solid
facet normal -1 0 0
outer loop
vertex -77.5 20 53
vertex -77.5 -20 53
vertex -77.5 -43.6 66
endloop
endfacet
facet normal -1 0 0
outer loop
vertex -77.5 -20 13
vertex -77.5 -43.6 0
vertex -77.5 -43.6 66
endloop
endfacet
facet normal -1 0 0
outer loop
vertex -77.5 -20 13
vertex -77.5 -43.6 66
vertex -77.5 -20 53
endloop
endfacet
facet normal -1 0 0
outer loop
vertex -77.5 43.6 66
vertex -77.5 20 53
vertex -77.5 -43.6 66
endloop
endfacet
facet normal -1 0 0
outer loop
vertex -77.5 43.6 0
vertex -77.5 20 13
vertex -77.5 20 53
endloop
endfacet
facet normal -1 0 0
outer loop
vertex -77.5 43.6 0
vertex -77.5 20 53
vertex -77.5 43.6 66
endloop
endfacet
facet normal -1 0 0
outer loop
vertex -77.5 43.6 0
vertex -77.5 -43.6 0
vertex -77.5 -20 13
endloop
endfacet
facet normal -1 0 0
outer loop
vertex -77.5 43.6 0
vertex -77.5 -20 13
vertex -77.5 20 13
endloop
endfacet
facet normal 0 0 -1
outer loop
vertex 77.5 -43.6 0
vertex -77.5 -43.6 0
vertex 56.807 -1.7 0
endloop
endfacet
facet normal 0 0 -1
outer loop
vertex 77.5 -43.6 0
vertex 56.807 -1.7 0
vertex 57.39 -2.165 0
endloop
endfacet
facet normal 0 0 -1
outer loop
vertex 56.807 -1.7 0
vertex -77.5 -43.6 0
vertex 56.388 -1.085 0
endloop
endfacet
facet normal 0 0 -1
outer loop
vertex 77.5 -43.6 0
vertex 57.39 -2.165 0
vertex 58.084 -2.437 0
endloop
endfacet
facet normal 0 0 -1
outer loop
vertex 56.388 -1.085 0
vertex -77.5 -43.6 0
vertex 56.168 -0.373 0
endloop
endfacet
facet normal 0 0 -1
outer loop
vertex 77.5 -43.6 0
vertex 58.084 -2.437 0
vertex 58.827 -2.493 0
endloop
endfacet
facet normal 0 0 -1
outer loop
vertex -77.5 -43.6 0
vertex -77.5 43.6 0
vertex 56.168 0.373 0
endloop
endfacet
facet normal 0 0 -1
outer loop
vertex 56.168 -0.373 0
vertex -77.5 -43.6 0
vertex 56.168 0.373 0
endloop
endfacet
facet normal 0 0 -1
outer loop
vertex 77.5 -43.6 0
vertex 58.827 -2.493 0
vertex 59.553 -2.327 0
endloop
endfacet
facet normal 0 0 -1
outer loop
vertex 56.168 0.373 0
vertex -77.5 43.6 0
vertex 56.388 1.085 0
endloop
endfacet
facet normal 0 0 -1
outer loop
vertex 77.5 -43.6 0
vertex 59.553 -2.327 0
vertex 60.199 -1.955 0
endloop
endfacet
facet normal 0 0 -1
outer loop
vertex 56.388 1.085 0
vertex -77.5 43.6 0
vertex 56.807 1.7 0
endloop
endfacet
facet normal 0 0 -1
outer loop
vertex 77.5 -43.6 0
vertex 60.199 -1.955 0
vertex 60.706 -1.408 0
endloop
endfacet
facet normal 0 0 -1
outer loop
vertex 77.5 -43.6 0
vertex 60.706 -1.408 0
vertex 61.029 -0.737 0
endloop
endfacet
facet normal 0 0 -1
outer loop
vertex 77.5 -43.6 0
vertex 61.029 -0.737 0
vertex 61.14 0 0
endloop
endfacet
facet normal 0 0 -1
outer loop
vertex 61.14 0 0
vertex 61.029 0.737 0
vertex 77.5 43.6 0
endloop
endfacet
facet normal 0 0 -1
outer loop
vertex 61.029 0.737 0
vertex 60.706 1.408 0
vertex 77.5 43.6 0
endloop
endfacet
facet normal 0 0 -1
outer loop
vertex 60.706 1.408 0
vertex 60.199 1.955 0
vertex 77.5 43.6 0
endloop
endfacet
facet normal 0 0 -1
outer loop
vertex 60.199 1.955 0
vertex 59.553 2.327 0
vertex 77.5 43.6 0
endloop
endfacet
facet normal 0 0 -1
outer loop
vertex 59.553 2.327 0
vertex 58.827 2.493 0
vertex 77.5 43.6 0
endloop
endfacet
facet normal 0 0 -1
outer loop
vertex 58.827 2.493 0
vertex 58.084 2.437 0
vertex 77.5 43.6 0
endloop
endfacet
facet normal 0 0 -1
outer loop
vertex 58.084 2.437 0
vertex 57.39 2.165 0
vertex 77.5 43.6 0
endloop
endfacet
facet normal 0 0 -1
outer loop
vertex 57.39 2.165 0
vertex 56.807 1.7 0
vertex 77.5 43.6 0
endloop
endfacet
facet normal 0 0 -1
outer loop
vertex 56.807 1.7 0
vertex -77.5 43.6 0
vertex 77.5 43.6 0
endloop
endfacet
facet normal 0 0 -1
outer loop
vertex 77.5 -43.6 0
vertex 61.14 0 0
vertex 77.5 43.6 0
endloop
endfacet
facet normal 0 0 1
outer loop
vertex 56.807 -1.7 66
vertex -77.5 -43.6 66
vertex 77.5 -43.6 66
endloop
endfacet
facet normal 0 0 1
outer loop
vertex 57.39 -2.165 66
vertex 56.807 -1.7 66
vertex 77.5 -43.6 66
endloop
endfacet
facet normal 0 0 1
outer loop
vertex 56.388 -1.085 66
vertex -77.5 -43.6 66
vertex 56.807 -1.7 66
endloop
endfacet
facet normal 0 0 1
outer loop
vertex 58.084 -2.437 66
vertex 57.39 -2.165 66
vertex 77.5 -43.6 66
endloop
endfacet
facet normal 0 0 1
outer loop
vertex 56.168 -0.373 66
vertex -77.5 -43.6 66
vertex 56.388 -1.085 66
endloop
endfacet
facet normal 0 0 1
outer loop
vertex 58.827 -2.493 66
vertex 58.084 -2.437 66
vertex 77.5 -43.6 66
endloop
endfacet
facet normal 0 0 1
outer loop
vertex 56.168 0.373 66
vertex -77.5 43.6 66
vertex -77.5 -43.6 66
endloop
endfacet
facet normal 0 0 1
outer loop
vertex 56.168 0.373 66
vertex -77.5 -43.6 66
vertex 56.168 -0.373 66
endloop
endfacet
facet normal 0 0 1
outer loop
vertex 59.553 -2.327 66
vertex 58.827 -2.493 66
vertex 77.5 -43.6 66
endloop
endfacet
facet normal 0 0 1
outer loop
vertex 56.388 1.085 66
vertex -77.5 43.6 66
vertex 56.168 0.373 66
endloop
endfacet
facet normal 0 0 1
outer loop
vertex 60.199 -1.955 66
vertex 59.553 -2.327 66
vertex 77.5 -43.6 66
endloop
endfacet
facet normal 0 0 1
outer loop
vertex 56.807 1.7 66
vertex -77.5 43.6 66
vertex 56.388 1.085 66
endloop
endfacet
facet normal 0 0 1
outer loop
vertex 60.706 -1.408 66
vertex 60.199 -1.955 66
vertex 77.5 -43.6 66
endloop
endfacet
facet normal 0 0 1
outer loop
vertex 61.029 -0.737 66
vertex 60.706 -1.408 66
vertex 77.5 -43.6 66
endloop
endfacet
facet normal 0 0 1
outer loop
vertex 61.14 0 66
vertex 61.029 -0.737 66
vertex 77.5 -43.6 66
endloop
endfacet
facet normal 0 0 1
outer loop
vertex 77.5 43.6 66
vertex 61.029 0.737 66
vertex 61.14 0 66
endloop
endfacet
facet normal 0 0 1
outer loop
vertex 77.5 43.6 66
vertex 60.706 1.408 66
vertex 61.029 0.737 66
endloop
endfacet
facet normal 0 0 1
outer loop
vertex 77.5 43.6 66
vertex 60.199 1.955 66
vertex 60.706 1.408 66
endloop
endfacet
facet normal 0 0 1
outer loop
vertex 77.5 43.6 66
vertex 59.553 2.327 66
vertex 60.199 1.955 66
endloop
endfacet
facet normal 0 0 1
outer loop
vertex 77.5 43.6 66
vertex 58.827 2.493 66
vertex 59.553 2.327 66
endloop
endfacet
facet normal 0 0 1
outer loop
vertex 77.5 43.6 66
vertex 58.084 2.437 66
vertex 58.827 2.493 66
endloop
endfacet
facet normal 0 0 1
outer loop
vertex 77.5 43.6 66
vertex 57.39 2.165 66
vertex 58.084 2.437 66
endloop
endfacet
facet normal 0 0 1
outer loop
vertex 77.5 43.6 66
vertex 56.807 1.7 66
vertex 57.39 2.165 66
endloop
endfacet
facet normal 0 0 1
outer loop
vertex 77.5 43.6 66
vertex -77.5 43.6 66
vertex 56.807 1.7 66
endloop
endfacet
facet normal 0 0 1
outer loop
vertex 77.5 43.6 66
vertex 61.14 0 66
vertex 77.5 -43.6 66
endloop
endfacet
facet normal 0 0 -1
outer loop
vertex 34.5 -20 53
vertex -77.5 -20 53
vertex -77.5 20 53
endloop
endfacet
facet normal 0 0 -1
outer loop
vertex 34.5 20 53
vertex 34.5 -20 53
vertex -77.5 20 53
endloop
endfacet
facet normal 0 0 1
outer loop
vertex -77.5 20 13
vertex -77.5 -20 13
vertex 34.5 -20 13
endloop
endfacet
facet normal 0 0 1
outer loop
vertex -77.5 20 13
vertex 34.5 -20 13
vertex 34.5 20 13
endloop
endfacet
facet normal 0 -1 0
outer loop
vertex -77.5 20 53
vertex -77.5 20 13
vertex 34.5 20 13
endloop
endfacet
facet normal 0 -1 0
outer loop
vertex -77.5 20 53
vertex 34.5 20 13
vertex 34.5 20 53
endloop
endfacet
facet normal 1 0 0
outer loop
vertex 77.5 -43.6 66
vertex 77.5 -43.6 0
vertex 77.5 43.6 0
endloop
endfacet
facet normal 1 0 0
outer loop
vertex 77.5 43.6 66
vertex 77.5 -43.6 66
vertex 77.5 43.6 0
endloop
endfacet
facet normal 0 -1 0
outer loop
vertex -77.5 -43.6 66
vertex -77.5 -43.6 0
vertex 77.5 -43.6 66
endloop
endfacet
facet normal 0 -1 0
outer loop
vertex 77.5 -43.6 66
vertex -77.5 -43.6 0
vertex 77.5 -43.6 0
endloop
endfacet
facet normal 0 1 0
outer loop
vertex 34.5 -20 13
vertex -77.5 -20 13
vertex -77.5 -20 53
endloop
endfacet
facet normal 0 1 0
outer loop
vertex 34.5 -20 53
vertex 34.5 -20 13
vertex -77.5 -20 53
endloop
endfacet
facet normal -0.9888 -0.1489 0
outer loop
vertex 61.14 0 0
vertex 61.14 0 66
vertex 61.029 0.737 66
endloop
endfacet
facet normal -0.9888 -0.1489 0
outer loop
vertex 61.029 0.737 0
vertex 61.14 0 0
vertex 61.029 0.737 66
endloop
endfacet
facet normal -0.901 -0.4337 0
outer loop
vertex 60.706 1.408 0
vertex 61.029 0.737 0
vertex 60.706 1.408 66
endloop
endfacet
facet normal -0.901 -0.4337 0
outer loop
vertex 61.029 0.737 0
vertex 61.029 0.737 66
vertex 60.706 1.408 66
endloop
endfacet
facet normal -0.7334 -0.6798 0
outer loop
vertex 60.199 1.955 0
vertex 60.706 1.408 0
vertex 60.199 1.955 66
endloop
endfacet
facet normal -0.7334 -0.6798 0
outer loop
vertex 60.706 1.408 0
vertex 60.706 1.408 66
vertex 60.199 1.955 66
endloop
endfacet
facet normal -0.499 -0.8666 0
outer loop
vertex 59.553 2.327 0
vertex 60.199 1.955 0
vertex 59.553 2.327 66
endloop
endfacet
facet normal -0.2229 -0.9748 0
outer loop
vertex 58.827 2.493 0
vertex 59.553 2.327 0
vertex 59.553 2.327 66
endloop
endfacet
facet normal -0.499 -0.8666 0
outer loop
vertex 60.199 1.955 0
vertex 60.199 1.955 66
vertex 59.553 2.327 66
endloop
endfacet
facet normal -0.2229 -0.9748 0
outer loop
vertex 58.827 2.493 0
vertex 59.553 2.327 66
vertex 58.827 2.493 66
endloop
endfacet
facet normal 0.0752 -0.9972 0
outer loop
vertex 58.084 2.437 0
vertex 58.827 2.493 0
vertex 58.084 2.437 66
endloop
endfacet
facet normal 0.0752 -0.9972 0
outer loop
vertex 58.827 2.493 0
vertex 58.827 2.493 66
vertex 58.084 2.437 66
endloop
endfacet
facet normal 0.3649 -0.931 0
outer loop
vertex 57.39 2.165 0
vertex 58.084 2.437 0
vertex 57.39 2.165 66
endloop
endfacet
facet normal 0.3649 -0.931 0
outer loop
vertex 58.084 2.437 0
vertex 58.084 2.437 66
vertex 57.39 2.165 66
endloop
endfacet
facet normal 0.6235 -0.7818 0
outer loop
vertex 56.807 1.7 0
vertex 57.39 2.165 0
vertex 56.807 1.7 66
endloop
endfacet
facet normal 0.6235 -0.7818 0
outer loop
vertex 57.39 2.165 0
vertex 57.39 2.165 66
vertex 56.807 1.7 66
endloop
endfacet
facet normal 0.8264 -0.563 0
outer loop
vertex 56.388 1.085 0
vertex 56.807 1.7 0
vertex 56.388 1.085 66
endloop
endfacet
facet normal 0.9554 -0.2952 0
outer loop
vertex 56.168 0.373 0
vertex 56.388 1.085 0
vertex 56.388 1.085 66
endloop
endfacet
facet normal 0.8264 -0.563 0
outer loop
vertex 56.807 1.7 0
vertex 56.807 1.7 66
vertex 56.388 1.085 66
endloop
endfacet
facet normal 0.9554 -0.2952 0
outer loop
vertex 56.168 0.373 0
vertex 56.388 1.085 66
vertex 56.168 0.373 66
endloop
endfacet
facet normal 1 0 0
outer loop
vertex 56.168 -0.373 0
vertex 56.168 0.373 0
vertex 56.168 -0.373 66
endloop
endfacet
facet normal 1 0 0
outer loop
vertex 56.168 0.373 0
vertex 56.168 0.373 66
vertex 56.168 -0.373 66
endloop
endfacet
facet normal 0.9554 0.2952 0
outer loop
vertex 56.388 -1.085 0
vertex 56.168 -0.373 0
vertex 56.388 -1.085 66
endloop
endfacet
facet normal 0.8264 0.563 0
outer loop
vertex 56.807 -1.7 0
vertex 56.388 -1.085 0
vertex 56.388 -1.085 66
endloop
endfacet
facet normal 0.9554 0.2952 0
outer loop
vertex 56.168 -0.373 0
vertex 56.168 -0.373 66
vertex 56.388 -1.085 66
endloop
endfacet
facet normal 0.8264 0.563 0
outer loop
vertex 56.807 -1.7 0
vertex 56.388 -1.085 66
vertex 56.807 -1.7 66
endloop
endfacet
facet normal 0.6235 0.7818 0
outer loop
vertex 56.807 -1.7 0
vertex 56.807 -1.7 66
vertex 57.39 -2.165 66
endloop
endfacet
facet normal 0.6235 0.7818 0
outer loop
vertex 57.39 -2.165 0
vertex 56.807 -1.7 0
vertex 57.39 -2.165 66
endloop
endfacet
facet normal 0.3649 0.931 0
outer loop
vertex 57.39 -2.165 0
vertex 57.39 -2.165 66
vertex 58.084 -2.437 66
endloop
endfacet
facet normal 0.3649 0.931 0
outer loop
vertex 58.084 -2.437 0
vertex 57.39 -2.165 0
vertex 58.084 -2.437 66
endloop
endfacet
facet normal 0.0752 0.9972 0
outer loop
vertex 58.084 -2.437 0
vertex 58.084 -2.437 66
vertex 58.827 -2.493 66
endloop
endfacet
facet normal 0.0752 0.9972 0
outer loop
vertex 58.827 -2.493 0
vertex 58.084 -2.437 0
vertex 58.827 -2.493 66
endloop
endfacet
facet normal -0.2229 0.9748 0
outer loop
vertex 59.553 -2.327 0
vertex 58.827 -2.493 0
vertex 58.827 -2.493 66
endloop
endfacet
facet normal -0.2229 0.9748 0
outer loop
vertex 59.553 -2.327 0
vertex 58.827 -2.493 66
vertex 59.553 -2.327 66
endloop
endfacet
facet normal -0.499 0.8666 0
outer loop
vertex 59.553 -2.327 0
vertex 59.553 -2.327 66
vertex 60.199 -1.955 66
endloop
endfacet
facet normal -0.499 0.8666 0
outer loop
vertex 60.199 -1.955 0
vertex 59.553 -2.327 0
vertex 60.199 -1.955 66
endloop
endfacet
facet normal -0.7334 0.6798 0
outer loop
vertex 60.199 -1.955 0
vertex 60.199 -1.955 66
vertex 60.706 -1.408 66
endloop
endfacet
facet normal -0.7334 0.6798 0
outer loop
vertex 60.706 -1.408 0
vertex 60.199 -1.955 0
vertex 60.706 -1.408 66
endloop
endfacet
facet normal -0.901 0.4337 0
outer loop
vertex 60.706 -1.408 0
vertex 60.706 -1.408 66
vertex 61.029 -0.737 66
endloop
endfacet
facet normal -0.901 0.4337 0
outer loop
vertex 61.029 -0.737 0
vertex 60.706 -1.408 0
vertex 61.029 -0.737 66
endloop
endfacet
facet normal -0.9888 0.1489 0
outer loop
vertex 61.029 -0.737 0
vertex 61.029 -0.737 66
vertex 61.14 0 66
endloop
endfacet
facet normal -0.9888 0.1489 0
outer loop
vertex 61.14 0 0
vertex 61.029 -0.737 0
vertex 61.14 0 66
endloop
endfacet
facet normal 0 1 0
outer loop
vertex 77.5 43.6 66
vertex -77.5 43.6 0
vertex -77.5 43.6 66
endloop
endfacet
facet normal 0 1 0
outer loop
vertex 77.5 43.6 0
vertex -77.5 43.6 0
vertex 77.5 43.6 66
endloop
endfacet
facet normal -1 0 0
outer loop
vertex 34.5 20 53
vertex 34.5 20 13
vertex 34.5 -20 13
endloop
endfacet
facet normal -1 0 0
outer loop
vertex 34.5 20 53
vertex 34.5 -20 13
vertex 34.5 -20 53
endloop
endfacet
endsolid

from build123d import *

# Parameters (mm, degrees)
IZIM1_W                     = 155
IZIM1_H                     = 87.2
Y_KSEKLIK_EKSTR_ZYON1_DEPTH = 66
IZIM2_R                     = 2.5
KES_EKSTR_ZYON1_DEPTH       = 111.739378723
IZIM3_W                     = 40
IZIM3_H                     = 40
KES_EKSTR_ZYON2_DEPTH       = 112


with BuildPart() as part:
    # Çizim1 → Yükseklik-Ekstrüzyon1 (new body)
    with BuildSketch(Plane.XY):
        Rectangle(IZIM1_W, IZIM1_H)
    extrude(amount=Y_KSEKLIK_EKSTR_ZYON1_DEPTH)

    # Çizim2 → Kes-Ekstrüzyon1 (cut, through all)
    with BuildSketch(Plane.XY.offset(66)):
        with Locations((58.64, 0)):
            Circle(IZIM2_R)
    extrude(amount=-KES_EKSTR_ZYON1_DEPTH, mode=Mode.SUBTRACT)

    # Çizim3 → Kes-Ekstrüzyon2 (cut)
    with BuildSketch(Plane.ZY.offset(77.5)):
        with Locations((33, 0)):
            Rectangle(IZIM3_W, IZIM3_H)
    extrude(amount=-KES_EKSTR_ZYON2_DEPTH, mode=Mode.SUBTRACT)


solid = part.part
